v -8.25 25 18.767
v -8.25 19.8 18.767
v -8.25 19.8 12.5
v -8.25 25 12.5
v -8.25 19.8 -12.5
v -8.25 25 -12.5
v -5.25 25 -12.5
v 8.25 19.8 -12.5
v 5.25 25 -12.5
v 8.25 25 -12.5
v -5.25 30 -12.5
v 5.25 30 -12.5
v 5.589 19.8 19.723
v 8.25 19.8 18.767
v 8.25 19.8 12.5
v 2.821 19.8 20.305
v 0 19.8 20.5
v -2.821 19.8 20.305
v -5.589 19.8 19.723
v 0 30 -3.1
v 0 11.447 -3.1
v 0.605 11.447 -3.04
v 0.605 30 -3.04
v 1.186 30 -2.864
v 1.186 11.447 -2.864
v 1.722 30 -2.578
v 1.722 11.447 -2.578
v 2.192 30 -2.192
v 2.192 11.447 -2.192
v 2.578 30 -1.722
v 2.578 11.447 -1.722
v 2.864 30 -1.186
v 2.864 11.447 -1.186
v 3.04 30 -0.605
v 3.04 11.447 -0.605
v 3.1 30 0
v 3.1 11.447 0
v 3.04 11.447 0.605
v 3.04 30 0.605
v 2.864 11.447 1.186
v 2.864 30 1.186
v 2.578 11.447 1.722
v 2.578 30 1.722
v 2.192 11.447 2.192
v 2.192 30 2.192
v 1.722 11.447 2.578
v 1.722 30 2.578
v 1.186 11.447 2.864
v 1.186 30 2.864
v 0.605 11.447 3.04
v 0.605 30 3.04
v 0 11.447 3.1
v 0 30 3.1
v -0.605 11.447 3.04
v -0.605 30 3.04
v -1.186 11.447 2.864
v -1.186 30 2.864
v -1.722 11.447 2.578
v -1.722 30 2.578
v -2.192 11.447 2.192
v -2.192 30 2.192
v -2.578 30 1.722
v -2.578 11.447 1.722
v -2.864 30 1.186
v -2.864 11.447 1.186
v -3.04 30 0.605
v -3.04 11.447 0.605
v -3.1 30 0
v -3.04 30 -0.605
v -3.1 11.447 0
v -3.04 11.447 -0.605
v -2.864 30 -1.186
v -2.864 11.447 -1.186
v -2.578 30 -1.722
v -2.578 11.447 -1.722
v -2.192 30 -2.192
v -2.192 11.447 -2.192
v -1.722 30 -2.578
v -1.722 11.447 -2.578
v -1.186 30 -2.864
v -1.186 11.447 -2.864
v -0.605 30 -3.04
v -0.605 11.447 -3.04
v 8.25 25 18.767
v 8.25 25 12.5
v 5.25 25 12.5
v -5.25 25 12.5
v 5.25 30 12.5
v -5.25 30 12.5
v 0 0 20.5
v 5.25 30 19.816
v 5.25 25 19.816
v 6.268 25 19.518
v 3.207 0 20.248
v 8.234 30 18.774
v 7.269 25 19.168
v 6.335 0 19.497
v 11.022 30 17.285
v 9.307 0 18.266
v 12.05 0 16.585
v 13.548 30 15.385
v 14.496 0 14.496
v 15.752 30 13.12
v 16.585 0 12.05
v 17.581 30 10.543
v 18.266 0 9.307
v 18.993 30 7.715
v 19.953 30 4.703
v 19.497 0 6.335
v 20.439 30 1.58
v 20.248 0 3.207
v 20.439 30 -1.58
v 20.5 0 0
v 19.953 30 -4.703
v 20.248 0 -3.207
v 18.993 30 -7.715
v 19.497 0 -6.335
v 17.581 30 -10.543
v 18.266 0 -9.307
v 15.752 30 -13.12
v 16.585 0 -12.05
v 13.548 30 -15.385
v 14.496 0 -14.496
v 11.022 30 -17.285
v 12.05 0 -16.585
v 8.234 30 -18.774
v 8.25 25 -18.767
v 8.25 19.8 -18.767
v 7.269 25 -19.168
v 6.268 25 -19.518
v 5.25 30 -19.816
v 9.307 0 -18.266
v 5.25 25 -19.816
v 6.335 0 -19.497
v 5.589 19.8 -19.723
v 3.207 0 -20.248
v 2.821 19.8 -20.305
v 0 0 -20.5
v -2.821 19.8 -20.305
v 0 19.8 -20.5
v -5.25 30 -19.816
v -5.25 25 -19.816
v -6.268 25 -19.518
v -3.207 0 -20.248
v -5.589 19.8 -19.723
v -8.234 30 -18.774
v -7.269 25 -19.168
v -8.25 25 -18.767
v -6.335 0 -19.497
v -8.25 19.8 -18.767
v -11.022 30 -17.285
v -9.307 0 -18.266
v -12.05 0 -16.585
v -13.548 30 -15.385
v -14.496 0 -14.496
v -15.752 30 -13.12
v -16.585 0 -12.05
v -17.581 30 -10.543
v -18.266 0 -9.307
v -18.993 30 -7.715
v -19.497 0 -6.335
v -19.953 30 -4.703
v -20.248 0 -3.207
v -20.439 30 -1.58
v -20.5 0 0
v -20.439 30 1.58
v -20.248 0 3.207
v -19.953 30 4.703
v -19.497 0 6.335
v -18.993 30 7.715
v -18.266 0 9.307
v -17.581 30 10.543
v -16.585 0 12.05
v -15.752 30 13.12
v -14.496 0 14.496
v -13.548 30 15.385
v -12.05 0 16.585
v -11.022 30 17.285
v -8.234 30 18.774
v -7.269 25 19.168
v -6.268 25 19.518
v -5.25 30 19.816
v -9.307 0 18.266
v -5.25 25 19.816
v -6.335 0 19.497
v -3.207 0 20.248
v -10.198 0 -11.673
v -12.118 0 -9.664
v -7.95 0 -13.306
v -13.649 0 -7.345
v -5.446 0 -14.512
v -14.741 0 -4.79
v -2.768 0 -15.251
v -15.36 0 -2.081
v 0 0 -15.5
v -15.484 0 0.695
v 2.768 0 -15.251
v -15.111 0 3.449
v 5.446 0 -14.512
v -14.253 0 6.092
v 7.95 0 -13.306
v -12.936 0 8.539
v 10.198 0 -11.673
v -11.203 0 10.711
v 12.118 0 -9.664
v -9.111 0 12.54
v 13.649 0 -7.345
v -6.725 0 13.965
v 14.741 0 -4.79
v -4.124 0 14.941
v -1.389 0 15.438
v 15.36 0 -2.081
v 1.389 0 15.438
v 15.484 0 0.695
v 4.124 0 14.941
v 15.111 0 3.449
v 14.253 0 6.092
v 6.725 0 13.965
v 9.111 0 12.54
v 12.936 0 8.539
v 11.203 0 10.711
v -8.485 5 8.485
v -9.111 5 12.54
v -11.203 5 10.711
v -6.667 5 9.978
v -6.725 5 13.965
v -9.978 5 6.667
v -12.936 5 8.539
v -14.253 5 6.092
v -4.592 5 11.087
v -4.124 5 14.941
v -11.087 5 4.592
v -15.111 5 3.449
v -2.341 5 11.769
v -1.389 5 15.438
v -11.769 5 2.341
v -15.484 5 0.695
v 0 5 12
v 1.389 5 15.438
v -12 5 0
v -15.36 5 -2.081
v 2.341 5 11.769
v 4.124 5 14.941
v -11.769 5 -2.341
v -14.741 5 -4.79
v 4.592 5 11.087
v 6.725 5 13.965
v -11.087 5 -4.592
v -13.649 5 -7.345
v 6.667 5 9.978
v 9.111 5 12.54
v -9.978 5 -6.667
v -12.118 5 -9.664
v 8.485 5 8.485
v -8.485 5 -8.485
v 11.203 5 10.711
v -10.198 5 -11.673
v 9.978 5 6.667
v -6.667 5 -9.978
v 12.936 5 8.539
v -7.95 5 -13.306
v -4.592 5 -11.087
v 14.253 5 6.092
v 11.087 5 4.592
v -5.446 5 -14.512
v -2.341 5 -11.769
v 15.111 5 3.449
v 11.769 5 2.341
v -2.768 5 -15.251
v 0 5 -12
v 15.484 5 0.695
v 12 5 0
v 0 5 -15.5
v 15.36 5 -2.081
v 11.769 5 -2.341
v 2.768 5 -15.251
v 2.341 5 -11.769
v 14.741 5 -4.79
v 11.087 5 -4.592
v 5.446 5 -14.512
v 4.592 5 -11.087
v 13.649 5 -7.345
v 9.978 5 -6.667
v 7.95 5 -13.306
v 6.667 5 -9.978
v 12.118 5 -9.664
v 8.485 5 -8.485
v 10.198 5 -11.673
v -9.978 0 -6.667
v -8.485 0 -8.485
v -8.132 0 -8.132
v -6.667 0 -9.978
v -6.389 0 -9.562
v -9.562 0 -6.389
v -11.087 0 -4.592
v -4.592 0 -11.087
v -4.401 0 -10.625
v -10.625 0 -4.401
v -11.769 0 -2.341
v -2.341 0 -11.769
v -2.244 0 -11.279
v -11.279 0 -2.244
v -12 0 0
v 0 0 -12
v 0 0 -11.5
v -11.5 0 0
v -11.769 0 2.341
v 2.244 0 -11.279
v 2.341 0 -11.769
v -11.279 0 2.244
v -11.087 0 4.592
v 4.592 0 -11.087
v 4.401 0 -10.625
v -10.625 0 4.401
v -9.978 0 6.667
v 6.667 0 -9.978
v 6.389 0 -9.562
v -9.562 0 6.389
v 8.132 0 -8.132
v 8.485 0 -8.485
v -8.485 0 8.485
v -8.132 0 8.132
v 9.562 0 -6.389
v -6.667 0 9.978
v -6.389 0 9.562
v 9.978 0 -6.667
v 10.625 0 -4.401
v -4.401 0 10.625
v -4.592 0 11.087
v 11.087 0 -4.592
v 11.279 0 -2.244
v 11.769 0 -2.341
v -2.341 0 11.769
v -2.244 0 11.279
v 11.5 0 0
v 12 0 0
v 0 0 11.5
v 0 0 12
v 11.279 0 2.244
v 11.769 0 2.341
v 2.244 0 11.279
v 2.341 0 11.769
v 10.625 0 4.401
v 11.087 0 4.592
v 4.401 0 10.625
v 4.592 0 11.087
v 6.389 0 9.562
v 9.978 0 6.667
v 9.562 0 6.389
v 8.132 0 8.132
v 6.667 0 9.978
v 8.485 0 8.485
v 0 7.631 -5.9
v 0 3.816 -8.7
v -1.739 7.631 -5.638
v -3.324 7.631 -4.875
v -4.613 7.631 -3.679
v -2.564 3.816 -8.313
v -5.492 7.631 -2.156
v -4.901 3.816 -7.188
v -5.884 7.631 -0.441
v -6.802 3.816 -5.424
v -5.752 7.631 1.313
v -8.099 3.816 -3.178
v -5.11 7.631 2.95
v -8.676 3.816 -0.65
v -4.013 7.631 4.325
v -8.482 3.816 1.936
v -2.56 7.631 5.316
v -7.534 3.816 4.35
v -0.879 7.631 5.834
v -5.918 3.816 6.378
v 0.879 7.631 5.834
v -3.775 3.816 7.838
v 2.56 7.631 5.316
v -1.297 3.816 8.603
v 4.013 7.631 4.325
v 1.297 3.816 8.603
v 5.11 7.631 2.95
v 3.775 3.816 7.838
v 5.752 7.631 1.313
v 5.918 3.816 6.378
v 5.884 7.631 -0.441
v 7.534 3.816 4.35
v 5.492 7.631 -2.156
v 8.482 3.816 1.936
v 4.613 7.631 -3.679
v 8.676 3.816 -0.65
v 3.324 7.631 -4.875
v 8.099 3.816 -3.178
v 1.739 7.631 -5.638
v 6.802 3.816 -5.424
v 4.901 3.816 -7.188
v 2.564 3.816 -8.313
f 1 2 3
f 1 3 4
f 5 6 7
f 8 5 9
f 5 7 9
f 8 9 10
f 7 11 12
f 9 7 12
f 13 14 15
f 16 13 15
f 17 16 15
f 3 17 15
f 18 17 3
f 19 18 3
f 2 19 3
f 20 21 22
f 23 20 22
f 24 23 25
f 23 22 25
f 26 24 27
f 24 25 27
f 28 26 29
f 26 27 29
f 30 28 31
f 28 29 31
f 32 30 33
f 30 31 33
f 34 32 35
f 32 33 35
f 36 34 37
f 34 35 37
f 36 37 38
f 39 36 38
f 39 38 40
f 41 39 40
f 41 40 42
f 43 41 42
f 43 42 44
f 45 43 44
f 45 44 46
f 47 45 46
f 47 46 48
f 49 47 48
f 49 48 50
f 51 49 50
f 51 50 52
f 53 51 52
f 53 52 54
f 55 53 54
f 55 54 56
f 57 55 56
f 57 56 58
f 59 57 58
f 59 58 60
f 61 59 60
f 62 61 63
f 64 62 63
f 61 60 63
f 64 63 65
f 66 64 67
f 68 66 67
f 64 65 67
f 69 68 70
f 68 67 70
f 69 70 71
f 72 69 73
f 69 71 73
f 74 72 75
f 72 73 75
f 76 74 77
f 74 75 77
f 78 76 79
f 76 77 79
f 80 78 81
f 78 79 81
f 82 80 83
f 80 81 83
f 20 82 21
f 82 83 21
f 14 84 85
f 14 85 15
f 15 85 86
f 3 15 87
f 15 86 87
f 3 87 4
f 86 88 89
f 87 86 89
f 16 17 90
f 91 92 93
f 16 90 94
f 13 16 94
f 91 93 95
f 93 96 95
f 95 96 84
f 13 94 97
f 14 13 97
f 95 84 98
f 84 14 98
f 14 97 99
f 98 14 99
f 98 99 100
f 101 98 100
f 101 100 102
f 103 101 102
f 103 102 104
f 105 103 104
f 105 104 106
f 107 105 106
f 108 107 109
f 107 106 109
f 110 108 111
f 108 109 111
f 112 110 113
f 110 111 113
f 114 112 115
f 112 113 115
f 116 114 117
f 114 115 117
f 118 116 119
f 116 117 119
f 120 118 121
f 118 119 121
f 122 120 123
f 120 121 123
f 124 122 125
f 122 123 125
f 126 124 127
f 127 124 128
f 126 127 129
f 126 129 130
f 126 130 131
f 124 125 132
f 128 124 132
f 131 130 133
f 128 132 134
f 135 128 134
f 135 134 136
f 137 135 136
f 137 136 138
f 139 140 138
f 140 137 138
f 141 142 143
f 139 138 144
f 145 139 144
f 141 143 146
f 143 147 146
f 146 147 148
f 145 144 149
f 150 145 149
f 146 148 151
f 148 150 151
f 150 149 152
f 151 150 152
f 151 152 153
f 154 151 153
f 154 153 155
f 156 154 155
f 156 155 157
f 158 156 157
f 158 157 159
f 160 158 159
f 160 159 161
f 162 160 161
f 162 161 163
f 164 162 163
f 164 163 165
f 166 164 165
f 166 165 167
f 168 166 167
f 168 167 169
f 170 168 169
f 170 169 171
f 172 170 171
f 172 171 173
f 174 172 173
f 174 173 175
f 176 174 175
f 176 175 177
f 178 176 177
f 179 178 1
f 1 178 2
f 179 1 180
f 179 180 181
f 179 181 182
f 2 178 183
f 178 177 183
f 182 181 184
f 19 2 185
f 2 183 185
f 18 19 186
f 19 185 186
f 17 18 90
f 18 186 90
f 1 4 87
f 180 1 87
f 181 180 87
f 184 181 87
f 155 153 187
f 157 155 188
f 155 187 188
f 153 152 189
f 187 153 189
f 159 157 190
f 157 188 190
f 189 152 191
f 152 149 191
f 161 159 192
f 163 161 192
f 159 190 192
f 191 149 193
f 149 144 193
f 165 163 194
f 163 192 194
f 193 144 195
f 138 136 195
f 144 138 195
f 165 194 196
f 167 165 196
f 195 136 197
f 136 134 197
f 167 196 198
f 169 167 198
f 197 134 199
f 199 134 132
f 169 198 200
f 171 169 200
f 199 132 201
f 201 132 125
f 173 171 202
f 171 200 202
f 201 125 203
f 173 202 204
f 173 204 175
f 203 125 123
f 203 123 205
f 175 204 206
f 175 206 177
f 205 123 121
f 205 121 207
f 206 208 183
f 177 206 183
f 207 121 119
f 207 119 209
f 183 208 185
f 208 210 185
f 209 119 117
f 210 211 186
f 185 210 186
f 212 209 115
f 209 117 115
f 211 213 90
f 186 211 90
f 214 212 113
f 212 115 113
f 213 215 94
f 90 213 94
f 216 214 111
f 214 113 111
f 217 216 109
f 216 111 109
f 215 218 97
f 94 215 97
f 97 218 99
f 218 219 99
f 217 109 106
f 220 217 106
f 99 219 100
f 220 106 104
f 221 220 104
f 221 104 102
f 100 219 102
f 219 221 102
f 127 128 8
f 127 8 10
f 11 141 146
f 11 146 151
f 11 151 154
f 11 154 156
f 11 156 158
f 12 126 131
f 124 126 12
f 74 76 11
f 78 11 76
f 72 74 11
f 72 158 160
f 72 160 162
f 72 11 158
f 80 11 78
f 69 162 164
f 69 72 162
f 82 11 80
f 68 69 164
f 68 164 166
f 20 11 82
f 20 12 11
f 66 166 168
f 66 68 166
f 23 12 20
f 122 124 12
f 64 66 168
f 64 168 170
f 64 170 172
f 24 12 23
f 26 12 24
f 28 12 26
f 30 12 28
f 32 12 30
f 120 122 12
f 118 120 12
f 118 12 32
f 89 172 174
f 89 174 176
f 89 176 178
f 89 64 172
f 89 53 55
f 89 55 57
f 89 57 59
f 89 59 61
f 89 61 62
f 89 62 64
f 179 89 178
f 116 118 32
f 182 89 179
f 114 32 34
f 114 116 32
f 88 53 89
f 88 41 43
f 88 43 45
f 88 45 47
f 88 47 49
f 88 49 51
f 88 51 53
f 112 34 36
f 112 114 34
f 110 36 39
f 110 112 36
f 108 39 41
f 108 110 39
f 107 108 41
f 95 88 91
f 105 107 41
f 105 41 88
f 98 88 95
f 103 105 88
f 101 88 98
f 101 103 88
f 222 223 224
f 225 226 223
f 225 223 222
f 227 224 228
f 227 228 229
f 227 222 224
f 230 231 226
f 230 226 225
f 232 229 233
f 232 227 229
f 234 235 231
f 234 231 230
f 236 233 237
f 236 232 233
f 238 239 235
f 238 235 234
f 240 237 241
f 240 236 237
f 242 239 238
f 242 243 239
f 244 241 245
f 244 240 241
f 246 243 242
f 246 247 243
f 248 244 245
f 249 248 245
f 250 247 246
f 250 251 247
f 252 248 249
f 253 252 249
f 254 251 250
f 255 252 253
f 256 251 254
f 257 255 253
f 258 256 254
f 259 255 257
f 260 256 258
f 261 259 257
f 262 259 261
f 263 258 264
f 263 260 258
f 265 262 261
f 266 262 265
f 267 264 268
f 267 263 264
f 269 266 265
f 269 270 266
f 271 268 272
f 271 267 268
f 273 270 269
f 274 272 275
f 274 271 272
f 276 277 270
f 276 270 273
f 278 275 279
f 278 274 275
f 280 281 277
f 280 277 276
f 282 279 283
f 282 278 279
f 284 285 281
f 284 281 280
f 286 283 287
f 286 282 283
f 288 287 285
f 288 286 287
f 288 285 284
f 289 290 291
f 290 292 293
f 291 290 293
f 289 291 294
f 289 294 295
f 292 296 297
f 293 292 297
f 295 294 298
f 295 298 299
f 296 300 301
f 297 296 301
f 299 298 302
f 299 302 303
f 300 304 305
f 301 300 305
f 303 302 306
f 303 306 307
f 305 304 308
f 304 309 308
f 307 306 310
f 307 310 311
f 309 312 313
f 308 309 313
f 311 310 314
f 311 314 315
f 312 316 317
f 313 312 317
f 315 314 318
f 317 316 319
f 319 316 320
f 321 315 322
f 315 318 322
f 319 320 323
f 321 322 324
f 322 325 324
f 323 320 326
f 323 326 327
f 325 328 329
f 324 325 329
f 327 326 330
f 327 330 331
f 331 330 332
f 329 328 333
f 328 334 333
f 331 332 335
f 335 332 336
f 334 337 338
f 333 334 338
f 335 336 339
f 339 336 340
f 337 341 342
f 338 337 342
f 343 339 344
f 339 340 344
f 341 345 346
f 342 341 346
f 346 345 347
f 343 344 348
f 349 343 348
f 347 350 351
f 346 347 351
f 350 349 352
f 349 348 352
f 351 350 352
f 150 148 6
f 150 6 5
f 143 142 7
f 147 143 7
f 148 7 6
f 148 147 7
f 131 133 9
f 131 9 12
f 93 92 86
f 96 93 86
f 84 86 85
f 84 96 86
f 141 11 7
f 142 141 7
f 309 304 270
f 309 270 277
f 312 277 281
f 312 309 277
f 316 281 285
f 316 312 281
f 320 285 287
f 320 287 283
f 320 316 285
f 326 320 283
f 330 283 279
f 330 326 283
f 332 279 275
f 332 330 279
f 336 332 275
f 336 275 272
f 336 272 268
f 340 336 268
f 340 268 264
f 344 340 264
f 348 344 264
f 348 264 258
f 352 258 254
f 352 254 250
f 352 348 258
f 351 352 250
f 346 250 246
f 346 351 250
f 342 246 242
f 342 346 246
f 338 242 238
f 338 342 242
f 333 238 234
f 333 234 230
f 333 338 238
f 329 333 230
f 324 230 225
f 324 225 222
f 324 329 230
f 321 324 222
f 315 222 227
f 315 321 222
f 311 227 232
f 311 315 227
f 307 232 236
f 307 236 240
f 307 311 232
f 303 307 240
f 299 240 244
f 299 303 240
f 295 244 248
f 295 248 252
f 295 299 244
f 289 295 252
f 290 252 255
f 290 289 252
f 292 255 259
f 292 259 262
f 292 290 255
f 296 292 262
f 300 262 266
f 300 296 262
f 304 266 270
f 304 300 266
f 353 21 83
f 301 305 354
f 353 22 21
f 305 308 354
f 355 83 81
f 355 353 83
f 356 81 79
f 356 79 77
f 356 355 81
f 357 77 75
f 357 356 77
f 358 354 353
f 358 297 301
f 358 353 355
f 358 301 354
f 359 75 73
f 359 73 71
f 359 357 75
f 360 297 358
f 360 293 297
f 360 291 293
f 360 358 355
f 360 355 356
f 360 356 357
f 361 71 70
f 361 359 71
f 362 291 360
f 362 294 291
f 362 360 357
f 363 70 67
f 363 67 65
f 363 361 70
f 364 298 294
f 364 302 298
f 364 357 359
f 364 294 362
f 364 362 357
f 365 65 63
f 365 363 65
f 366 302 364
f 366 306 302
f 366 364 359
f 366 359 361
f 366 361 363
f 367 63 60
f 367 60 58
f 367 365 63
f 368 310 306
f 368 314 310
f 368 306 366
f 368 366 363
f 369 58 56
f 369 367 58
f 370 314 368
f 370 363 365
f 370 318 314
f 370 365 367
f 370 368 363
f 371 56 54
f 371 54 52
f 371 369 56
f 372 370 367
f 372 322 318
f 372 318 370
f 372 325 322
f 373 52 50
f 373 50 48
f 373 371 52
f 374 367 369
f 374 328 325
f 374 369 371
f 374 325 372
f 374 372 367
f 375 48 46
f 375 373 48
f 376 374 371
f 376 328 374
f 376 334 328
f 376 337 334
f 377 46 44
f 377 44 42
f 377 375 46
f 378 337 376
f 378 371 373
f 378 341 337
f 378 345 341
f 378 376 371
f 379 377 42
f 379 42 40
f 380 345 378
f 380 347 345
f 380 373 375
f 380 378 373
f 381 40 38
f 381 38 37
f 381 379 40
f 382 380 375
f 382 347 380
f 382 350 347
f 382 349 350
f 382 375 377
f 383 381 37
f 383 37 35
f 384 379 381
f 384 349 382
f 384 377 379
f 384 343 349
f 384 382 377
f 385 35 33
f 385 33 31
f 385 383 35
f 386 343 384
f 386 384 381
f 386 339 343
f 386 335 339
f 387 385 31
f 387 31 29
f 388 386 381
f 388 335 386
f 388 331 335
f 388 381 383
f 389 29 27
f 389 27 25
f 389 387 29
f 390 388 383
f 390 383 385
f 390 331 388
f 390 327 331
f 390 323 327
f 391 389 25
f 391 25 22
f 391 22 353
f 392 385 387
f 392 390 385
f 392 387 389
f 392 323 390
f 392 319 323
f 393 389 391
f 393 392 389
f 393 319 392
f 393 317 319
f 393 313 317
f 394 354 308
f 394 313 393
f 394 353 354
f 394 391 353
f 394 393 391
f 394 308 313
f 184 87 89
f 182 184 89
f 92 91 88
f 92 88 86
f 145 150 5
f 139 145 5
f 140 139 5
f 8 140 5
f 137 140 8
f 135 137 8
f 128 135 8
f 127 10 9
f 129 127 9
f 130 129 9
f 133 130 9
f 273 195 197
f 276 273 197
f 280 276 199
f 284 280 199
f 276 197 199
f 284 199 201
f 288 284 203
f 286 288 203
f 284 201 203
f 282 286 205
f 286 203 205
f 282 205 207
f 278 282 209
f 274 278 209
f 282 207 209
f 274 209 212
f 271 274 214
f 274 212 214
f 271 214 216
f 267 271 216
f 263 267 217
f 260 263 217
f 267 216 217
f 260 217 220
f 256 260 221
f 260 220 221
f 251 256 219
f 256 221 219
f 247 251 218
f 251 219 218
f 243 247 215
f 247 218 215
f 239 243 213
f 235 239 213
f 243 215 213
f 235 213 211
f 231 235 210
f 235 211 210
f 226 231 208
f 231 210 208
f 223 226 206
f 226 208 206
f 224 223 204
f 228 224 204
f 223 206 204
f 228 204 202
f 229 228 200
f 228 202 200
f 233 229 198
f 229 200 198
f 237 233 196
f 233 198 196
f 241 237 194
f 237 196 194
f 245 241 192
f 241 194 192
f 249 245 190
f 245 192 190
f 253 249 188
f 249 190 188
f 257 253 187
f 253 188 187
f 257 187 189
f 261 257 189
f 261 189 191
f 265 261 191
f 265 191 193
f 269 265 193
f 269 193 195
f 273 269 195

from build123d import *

# Parameters (mm, degrees)
SKETCH2_R           = 20.5
BOSS_EXTRUDE2_DEPTH = 30
SKETCH4_R           = 15.5
SKETCH4_R_2         = 12
CUT_EXTRUDE2_DEPTH  = 5
SKETCH6_R           = 3.1
CUT_EXTRUDE3_DEPTH  = 35.419562394
CUT_EXTRUDE4_DEPTH  = 8
CUT_EXTRUDE6_DEPTH  = 8


with BuildPart() as part:
    # Sketch2 → Boss-Extrude2 (new body)
    with BuildSketch(Plane(origin=(0, 0, 0), x_dir=(1, 0, 0), z_dir=(0, 1, 0))):
        with Locations(Location((0, 0, 0), (0, 0, 270))):
            Circle(SKETCH2_R)
    extrude(amount=BOSS_EXTRUDE2_DEPTH)

    # Sketch4 → Cut-Extrude2 (cut)
    with BuildSketch(Plane.XZ):
        with Locations(Location((0, 0, 0), (0, 0, 270))):
            Circle(SKETCH4_R)
        with Locations(Location((0, 0, 0), (0, 0, 270))):
            Circle(SKETCH4_R_2, mode=Mode.SUBTRACT)
    extrude(amount=-CUT_EXTRUDE2_DEPTH, mode=Mode.SUBTRACT)

    # Sketch5 → Cut-Revolve1 (revolve, cut)
    with BuildSketch(Plane.XY, mode=Mode.PRIVATE) as cut_revolve1_sk:
        Polygon((0, 0), (0, 11.447203031), (3.1, 11.447203031), (11.5, 0), align=None)
    revolve(cut_revolve1_sk.sketch.rotate(Axis((0, 0, 0), (0, 1, 0)), 90), axis=Axis((0, 0, 0), (0, 1, 0)), mode=Mode.SUBTRACT)

    # Sketch6 → Cut-Extrude3 (cut, through all)
    with BuildSketch(Plane.XZ.offset(-11.447203031)):
        with Locations(Location((0, 0, 0), (0, 0, 270))):
            Circle(SKETCH6_R)
    extrude(amount=-CUT_EXTRUDE3_DEPTH, mode=Mode.SUBTRACT)

    # Sketch8 → Cut-Extrude4 (cut)
    with BuildSketch(Plane.XY.offset(20.5)):
        Polygon((-5.25, 30), (5.25, 30), (5.25, 25), (8.25, 25), (8.25, 19.8), (-8.25, 19.8), (-8.25, 25), (-5.25, 25), align=None)
    extrude(amount=-CUT_EXTRUDE4_DEPTH, mode=Mode.SUBTRACT)

    # Sketch9 → Cut-Extrude6 (cut)
    with BuildSketch(Plane.XY.offset(-20.5)):
        Polygon((5.25, 30), (-5.25, 30), (-5.25, 25), (-8.25, 25), (-8.25, 19.8), (8.25, 19.8), (8.25, 25), (5.25, 25), align=None)
    extrude(amount=CUT_EXTRUDE6_DEPTH, mode=Mode.SUBTRACT)


solid = part.part
